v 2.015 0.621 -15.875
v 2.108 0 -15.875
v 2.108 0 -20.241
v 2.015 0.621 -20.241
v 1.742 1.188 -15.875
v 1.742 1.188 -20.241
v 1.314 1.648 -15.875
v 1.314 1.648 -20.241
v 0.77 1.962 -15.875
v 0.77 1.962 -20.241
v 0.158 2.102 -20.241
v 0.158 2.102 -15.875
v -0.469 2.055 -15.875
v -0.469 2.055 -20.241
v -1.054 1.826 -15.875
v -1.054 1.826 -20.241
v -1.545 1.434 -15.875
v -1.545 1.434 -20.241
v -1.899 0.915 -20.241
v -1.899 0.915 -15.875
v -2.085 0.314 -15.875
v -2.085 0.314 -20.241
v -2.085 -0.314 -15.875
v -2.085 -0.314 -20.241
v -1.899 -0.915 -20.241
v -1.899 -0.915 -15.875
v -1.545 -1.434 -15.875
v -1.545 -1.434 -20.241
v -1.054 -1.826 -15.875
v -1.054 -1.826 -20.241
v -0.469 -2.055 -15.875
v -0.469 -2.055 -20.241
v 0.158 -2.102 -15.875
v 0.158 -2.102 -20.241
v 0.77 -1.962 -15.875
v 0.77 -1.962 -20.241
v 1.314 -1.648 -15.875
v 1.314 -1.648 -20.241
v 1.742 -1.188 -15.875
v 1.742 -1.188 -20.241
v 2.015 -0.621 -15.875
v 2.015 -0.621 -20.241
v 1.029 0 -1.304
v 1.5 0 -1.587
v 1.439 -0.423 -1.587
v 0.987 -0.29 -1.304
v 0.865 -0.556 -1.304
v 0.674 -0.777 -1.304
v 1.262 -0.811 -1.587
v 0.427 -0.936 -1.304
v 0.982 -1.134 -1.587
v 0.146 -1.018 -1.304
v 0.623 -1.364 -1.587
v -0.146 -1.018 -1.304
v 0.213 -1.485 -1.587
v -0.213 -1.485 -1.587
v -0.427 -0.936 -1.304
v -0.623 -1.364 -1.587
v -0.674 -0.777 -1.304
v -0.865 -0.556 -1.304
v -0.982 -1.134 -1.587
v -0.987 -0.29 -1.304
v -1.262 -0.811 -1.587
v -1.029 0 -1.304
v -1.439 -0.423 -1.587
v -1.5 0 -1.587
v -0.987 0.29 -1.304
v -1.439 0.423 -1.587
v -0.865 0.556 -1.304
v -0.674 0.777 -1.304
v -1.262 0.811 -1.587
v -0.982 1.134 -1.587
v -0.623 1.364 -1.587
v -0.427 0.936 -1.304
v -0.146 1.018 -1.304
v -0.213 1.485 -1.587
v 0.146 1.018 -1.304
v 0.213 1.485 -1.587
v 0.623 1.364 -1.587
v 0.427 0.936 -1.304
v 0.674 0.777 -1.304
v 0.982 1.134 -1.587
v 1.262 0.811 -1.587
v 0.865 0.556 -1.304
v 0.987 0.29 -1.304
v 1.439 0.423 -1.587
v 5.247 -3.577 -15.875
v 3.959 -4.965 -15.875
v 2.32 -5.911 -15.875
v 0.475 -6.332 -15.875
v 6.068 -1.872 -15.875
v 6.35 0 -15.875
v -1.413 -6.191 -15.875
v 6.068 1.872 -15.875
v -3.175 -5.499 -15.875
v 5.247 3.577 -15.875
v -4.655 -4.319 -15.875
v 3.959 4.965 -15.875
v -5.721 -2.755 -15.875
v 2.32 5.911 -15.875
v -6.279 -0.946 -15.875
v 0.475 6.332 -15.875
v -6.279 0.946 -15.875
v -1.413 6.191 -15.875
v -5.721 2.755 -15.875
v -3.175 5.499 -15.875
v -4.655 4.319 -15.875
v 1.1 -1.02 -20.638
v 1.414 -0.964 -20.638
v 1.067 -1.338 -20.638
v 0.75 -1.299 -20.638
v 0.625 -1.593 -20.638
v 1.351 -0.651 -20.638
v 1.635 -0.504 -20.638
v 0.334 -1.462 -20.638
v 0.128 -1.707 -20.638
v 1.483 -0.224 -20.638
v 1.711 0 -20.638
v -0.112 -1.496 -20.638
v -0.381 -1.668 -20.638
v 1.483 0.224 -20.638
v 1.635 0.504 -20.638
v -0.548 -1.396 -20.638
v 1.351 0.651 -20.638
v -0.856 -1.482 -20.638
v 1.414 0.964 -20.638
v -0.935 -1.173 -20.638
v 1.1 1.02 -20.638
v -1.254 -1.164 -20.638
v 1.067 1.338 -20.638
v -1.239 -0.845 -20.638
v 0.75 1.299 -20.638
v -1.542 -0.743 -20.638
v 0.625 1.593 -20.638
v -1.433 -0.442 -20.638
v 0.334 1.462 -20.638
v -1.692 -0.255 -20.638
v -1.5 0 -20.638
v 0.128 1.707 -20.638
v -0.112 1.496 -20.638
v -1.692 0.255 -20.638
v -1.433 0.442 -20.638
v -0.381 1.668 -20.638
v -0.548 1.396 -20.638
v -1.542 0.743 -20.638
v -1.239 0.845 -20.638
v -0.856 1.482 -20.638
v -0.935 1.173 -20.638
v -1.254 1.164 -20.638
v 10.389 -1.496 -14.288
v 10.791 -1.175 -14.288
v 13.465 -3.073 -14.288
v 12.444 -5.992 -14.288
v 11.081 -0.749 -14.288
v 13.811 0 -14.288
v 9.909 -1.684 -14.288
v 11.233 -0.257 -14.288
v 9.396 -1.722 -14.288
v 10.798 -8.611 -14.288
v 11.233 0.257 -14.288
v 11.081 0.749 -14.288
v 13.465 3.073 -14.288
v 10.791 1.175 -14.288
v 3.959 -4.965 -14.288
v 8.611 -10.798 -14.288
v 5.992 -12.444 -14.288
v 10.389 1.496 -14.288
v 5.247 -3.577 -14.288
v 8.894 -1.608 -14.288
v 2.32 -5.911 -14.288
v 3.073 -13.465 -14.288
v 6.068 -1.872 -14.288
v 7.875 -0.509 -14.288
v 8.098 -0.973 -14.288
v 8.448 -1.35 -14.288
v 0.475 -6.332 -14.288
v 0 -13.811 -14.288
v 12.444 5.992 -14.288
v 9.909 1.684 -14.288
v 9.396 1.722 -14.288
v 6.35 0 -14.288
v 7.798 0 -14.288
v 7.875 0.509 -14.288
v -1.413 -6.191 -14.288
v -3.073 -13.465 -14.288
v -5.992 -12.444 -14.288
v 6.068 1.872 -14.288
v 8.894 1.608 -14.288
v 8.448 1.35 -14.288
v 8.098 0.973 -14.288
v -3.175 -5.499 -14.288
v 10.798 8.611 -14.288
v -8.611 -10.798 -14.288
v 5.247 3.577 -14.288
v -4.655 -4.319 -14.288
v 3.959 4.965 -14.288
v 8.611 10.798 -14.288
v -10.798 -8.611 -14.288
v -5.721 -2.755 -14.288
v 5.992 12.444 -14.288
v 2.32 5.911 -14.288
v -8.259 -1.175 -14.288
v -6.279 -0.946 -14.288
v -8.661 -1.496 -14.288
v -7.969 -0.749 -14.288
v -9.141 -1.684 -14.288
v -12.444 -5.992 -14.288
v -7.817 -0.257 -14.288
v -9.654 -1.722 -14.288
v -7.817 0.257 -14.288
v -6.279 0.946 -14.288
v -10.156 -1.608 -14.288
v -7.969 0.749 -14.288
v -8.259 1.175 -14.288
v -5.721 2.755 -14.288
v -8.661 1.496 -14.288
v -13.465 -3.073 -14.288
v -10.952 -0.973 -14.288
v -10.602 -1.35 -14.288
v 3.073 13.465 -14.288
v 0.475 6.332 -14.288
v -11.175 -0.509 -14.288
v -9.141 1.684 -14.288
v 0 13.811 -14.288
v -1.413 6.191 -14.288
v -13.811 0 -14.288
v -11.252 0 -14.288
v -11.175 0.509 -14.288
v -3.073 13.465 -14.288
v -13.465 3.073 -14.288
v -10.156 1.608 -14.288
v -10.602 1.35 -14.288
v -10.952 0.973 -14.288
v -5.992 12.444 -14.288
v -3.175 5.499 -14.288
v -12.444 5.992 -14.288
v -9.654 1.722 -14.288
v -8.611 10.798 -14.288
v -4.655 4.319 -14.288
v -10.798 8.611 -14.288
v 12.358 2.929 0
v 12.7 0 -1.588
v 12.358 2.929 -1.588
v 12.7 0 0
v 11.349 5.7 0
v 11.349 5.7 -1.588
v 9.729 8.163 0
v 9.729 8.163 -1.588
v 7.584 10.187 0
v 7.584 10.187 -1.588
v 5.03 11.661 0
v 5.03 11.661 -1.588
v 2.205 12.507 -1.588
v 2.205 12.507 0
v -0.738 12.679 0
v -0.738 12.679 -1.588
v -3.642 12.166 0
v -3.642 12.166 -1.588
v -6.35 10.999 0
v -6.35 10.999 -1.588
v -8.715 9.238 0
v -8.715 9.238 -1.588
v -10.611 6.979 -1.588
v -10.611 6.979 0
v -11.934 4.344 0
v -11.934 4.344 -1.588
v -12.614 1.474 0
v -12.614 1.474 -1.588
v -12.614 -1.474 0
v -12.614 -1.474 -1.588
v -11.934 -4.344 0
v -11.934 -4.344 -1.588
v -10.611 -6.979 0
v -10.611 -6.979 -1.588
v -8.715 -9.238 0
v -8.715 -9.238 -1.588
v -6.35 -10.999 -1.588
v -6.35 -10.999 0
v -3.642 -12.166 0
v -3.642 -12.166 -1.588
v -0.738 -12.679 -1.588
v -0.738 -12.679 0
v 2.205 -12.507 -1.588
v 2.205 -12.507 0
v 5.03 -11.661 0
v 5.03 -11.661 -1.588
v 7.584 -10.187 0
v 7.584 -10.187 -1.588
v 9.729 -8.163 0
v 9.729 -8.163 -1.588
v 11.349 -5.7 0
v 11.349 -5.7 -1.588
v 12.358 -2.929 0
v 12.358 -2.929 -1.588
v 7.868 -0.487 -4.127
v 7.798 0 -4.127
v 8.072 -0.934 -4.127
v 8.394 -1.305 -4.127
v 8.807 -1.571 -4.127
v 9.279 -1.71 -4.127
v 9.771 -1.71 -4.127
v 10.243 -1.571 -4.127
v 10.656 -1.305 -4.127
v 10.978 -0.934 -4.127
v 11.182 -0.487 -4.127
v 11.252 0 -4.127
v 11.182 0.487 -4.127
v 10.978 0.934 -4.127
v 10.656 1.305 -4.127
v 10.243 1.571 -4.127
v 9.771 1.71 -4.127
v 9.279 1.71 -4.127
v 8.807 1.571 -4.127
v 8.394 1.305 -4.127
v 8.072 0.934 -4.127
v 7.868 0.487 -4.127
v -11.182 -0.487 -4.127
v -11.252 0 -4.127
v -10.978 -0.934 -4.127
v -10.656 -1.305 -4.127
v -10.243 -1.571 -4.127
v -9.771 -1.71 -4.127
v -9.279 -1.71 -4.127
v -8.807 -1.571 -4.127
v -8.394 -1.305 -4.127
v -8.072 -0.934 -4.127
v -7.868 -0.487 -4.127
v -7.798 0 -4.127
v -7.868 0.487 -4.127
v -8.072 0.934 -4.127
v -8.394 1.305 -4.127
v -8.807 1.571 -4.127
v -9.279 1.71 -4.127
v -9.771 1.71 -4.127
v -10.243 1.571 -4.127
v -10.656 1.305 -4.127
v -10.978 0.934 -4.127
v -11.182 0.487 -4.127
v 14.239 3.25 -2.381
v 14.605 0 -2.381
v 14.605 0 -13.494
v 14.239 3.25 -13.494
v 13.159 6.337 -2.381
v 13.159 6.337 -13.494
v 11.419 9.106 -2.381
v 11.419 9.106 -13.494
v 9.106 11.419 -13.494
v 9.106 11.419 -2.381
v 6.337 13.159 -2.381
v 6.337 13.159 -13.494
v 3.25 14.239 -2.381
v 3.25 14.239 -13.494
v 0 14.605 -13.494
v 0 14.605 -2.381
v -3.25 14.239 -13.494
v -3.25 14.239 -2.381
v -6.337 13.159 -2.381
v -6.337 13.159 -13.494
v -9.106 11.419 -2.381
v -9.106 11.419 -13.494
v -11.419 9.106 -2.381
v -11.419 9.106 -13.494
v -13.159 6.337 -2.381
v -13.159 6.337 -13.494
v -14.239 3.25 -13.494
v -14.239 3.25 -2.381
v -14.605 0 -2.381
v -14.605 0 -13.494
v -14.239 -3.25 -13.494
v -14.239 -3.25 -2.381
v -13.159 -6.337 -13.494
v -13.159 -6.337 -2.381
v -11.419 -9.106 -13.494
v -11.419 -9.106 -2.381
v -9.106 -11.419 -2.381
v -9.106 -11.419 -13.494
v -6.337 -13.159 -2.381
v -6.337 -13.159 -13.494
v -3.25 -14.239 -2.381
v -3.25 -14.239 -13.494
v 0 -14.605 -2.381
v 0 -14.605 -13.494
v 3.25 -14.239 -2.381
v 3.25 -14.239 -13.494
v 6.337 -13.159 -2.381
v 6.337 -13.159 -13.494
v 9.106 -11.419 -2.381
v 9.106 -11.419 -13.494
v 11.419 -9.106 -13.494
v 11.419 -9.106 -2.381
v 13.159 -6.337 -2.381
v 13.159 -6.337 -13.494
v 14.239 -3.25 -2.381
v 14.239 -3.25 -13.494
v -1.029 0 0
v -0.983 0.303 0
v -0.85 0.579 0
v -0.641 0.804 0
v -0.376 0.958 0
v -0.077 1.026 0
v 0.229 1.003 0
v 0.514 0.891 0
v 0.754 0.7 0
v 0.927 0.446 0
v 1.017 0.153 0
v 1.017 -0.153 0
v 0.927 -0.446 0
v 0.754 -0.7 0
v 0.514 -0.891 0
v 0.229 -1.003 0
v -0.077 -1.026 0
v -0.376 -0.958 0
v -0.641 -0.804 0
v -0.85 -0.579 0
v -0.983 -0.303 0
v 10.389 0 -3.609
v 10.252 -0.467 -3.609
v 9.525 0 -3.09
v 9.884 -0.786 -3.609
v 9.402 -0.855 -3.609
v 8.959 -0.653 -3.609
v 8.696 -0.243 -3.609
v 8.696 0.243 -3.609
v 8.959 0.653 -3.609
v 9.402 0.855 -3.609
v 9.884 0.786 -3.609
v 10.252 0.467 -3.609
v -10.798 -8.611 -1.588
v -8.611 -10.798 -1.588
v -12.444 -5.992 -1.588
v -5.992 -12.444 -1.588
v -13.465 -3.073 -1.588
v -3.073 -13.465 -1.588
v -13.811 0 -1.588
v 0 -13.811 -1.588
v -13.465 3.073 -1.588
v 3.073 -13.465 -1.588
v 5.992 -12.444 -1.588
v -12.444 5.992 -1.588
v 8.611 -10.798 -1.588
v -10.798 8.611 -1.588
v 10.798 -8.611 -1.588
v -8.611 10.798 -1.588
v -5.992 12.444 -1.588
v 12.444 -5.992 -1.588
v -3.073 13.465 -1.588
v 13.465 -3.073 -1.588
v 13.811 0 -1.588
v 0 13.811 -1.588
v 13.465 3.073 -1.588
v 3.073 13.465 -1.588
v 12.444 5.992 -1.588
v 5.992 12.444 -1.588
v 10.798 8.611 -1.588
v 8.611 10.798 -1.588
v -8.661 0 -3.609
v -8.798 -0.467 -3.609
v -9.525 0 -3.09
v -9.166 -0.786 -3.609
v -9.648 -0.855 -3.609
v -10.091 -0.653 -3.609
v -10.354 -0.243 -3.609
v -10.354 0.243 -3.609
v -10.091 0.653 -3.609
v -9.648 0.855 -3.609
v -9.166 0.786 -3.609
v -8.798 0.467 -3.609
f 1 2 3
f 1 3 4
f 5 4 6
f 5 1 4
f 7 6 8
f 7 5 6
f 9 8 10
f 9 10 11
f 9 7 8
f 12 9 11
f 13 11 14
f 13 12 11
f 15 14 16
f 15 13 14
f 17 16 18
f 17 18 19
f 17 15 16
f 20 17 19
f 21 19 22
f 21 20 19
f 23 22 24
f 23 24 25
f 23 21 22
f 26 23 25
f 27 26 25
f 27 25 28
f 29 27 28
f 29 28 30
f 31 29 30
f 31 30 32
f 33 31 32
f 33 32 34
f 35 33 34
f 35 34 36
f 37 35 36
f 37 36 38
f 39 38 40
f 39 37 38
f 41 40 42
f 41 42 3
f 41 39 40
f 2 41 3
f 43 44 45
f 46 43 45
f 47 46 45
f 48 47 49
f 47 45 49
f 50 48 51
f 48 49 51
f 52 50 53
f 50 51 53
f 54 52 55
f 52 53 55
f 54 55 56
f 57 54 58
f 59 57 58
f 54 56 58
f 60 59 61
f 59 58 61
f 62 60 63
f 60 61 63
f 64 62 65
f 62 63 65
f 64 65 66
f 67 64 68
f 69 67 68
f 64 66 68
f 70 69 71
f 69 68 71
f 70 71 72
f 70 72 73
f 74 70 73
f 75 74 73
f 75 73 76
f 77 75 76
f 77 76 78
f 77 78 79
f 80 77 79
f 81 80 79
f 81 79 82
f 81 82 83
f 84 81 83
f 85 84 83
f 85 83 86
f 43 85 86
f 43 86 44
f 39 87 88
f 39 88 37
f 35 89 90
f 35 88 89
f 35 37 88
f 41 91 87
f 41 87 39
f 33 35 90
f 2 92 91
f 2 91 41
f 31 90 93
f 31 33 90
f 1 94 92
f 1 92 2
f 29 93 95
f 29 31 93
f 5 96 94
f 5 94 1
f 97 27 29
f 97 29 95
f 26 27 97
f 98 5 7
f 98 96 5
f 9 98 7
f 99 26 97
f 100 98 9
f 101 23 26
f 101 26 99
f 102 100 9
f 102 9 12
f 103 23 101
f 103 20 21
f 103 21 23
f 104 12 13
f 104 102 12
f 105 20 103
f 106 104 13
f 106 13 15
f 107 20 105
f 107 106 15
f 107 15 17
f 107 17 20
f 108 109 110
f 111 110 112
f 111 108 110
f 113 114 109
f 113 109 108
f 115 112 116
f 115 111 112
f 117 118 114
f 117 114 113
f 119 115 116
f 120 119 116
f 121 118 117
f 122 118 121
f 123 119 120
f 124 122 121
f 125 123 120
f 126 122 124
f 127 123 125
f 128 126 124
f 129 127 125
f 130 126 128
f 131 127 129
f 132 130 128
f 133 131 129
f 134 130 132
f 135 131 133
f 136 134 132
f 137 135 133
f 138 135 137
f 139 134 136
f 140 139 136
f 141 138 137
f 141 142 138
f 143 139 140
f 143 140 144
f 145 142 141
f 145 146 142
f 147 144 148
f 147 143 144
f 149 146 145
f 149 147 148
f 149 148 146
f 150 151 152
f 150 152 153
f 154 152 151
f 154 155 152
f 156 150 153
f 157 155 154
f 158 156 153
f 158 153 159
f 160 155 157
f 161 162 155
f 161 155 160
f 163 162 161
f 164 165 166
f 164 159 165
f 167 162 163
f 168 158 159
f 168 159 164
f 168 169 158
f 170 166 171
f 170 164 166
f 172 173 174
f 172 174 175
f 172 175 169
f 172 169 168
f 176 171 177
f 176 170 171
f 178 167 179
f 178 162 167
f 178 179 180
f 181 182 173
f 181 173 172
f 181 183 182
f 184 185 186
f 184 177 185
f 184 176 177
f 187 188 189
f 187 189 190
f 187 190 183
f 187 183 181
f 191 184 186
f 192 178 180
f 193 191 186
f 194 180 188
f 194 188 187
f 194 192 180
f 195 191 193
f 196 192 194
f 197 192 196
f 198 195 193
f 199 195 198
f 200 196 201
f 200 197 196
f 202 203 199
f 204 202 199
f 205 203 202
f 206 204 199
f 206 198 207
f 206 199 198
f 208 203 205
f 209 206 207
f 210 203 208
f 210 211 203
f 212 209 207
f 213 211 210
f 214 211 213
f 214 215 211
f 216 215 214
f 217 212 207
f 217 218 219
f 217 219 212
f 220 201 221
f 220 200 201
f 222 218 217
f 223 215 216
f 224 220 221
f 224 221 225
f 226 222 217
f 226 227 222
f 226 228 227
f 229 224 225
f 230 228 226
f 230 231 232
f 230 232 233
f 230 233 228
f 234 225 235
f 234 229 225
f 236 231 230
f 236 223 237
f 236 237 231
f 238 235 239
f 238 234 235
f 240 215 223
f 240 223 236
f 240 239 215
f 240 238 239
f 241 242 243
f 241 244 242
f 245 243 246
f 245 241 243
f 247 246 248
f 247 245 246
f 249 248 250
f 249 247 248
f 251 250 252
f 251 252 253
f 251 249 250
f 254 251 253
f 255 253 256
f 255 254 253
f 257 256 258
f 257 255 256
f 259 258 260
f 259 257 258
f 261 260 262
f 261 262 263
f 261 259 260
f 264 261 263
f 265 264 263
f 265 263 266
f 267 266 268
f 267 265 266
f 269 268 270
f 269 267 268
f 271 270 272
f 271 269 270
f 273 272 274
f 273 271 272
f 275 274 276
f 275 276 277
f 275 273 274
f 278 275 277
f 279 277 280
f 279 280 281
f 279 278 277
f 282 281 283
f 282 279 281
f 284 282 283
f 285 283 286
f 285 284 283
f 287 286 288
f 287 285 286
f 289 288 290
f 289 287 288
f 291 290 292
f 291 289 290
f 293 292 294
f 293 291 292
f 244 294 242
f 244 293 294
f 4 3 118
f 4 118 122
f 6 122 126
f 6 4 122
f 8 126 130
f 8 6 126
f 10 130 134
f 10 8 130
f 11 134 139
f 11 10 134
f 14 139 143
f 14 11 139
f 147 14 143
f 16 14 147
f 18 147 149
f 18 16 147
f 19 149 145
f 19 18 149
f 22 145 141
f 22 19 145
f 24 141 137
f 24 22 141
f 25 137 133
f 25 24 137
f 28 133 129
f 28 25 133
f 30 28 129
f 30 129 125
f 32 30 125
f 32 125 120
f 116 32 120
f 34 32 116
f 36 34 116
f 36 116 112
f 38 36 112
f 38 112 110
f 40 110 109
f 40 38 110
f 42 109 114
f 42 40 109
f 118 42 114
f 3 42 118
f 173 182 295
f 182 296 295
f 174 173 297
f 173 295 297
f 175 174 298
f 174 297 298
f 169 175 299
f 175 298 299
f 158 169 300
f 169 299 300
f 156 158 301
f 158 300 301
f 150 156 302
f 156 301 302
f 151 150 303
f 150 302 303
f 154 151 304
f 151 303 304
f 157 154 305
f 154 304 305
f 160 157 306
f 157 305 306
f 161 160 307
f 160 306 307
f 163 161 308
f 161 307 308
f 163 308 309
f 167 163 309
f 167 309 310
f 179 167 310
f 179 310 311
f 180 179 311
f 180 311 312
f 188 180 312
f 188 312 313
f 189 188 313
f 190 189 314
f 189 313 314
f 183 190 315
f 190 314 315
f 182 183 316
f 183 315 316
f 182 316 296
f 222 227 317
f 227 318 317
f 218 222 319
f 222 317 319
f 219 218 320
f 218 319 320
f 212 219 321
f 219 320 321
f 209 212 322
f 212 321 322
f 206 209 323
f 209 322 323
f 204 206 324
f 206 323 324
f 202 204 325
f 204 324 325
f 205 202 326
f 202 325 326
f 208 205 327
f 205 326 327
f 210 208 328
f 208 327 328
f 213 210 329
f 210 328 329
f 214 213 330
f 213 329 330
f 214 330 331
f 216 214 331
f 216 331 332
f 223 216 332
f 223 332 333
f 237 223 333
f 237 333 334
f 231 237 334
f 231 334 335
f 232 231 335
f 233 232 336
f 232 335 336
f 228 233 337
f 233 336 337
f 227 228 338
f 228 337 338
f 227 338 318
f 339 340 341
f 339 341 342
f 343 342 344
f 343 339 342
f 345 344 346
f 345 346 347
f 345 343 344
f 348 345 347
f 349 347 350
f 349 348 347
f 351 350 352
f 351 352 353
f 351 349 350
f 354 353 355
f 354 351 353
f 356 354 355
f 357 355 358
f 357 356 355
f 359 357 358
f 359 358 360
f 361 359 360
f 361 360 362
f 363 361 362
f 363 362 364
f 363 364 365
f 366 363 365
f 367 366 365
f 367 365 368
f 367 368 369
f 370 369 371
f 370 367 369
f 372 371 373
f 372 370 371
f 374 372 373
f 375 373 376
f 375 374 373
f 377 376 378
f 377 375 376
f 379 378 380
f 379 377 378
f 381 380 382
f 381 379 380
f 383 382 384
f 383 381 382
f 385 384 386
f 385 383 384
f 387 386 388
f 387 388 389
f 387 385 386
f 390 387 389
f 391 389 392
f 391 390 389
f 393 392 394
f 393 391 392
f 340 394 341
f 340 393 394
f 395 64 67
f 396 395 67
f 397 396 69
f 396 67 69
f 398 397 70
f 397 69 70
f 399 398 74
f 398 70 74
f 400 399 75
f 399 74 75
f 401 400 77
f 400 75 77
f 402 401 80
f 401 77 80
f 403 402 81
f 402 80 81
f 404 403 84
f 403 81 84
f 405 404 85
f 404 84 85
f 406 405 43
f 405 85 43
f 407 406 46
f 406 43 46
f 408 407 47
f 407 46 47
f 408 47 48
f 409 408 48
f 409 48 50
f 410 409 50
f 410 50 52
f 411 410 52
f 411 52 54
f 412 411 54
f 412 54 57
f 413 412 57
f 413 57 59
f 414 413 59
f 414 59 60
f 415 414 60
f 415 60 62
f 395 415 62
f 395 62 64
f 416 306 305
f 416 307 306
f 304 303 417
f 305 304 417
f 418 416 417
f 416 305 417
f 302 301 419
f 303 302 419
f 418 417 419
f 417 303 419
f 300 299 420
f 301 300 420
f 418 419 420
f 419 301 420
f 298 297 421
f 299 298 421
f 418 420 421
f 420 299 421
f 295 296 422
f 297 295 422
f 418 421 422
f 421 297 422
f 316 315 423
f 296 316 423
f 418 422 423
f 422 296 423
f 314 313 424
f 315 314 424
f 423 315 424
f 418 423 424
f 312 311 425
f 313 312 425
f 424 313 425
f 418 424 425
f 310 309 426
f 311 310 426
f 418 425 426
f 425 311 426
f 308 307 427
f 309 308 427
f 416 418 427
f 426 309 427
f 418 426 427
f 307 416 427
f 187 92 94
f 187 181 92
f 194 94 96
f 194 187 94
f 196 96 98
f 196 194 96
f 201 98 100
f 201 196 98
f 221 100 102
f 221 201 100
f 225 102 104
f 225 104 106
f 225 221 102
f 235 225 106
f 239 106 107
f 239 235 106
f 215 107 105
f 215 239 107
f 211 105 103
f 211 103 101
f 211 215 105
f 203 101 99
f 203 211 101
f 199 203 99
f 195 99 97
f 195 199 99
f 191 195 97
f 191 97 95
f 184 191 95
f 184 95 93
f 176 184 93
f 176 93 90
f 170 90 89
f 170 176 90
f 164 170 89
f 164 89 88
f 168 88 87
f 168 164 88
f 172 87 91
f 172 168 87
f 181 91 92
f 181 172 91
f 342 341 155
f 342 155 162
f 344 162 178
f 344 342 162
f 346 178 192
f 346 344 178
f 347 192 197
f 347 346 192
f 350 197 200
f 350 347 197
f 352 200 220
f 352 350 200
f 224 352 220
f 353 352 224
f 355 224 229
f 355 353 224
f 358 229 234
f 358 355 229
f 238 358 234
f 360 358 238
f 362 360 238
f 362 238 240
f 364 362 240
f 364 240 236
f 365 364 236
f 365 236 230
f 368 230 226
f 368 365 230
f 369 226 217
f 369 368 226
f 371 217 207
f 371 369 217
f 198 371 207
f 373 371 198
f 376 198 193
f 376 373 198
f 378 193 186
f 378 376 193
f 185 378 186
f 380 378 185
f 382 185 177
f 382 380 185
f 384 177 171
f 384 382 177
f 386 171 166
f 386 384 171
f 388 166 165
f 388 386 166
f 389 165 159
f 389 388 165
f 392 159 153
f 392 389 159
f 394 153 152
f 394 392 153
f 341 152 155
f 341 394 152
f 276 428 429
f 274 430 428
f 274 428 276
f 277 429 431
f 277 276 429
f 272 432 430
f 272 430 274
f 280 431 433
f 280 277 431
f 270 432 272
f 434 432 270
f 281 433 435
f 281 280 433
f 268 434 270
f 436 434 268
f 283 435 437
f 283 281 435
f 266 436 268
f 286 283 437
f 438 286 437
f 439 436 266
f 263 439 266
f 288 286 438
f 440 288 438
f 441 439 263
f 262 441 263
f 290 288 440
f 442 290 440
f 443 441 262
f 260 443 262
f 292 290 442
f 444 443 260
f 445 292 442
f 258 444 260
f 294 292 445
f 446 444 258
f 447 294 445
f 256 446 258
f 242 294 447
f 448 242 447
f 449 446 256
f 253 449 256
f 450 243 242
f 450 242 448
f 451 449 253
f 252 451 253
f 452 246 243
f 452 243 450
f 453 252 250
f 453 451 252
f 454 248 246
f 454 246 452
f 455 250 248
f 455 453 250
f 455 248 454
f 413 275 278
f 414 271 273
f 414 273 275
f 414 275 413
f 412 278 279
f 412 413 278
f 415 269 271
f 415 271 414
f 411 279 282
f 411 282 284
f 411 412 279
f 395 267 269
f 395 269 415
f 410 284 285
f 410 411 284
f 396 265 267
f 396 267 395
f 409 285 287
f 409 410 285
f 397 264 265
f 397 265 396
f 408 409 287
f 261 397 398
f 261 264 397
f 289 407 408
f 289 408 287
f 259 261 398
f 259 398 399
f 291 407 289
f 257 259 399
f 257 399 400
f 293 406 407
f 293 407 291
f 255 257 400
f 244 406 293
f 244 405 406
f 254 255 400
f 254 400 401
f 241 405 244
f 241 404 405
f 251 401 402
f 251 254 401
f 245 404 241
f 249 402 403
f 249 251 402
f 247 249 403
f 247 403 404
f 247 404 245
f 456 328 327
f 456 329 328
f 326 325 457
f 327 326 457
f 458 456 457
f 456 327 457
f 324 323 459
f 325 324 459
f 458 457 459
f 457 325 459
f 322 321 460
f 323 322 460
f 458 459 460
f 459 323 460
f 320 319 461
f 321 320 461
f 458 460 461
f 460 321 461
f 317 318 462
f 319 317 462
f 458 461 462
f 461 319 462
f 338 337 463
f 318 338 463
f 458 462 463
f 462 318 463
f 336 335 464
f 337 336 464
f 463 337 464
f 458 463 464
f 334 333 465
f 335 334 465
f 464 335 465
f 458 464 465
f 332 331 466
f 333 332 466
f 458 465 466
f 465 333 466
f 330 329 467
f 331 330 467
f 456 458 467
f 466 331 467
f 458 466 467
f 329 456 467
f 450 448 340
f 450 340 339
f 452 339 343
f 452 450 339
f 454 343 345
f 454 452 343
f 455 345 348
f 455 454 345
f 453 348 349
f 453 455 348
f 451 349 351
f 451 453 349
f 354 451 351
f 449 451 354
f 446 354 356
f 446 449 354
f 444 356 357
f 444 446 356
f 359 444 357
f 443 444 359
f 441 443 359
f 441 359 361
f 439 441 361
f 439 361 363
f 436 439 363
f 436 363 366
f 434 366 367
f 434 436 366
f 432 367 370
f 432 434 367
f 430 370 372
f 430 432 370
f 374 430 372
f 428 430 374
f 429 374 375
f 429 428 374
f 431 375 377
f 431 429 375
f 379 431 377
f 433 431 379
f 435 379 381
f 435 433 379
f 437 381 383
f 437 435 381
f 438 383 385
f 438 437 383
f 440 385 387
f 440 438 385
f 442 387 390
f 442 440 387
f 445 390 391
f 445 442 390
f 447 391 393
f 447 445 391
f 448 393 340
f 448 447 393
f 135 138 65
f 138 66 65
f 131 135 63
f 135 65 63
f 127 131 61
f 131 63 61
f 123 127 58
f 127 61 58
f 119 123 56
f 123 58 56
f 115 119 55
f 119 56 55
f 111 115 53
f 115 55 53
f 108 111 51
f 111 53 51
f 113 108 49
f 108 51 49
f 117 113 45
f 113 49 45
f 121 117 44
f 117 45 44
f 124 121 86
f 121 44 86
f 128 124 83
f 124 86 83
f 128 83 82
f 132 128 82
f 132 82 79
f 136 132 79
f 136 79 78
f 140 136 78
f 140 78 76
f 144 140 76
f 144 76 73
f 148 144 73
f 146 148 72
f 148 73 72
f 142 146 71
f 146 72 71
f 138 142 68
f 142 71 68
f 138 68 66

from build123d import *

# Parameters (mm, degrees)
F3_D     = 2.0574
F5_D     = 3
F5_DEPTH = 19.05
F5_TIP   = 0.9012909285
F6_SIZE  = 0.396875
F7_SIZE  = 0.79375
F9_D     = 3.4544
F9_DEPTH = 10.16
F9_TIP   = 1.0378064612


with BuildPart() as f1:
    # F0 (on Front) → F1 (revolve)
    with BuildSketch(Plane.XZ):
        Polygon((12.7, 0), (0, 0), (0, -20.6375), (2.1082, -20.6375), (2.1082, -15.875), (6.35, -15.875), (6.35, -14.2875), (14.605, -14.2875), (14.605, -1.5875), (12.7, -1.5875), align=None)
    revolve(axis=Axis((0, 0, -10.31875), (0, 0, 1)))

    # F3 (through all)
    with Locations(Plane.XY):
        with Locations((0, 0)):
            Hole(F3_D / 2)

    # F5
    with Locations(Plane(origin=(0, 0, -20.6375), x_dir=(1, 0, 0), z_dir=(0, 0, -1))):
        with Locations((0, 0)):
            Hole(F5_D / 2, depth=F5_DEPTH)
            with Locations((0, 0, -(F5_DEPTH + F5_TIP / 2))):  # 118° drill point
                Cone(0, F5_D / 2, F5_TIP, mode=Mode.SUBTRACT)

    # F6
    f6_edges = [f1.edges().sort_by_distance(p)[0] for p in [
        (-2.1082, 0, -20.6375),
    ]]
    chamfer(f6_edges, length=F6_SIZE)

    # F7
    f7_edges = [f1.edges().sort_by_distance(p)[0] for p in [
        (-14.605, 0, -1.5875),
        (-14.605, 0, -14.2875),
    ]]
    chamfer(f7_edges, length=F7_SIZE)

    # F9
    with Locations(Plane(origin=(0, 0, -14.2875), x_dir=(1, 0, 0), z_dir=(0, 0, -1))):
        with Locations((-9.525000882, 0), (9.524999118, 0)):
            Hole(F9_D / 2, depth=F9_DEPTH)
            with Locations((0, 0, -(F9_DEPTH + F9_TIP / 2))):  # 118° drill point
                Cone(0, F9_D / 2, F9_TIP, mode=Mode.SUBTRACT)


solid = f1.part
